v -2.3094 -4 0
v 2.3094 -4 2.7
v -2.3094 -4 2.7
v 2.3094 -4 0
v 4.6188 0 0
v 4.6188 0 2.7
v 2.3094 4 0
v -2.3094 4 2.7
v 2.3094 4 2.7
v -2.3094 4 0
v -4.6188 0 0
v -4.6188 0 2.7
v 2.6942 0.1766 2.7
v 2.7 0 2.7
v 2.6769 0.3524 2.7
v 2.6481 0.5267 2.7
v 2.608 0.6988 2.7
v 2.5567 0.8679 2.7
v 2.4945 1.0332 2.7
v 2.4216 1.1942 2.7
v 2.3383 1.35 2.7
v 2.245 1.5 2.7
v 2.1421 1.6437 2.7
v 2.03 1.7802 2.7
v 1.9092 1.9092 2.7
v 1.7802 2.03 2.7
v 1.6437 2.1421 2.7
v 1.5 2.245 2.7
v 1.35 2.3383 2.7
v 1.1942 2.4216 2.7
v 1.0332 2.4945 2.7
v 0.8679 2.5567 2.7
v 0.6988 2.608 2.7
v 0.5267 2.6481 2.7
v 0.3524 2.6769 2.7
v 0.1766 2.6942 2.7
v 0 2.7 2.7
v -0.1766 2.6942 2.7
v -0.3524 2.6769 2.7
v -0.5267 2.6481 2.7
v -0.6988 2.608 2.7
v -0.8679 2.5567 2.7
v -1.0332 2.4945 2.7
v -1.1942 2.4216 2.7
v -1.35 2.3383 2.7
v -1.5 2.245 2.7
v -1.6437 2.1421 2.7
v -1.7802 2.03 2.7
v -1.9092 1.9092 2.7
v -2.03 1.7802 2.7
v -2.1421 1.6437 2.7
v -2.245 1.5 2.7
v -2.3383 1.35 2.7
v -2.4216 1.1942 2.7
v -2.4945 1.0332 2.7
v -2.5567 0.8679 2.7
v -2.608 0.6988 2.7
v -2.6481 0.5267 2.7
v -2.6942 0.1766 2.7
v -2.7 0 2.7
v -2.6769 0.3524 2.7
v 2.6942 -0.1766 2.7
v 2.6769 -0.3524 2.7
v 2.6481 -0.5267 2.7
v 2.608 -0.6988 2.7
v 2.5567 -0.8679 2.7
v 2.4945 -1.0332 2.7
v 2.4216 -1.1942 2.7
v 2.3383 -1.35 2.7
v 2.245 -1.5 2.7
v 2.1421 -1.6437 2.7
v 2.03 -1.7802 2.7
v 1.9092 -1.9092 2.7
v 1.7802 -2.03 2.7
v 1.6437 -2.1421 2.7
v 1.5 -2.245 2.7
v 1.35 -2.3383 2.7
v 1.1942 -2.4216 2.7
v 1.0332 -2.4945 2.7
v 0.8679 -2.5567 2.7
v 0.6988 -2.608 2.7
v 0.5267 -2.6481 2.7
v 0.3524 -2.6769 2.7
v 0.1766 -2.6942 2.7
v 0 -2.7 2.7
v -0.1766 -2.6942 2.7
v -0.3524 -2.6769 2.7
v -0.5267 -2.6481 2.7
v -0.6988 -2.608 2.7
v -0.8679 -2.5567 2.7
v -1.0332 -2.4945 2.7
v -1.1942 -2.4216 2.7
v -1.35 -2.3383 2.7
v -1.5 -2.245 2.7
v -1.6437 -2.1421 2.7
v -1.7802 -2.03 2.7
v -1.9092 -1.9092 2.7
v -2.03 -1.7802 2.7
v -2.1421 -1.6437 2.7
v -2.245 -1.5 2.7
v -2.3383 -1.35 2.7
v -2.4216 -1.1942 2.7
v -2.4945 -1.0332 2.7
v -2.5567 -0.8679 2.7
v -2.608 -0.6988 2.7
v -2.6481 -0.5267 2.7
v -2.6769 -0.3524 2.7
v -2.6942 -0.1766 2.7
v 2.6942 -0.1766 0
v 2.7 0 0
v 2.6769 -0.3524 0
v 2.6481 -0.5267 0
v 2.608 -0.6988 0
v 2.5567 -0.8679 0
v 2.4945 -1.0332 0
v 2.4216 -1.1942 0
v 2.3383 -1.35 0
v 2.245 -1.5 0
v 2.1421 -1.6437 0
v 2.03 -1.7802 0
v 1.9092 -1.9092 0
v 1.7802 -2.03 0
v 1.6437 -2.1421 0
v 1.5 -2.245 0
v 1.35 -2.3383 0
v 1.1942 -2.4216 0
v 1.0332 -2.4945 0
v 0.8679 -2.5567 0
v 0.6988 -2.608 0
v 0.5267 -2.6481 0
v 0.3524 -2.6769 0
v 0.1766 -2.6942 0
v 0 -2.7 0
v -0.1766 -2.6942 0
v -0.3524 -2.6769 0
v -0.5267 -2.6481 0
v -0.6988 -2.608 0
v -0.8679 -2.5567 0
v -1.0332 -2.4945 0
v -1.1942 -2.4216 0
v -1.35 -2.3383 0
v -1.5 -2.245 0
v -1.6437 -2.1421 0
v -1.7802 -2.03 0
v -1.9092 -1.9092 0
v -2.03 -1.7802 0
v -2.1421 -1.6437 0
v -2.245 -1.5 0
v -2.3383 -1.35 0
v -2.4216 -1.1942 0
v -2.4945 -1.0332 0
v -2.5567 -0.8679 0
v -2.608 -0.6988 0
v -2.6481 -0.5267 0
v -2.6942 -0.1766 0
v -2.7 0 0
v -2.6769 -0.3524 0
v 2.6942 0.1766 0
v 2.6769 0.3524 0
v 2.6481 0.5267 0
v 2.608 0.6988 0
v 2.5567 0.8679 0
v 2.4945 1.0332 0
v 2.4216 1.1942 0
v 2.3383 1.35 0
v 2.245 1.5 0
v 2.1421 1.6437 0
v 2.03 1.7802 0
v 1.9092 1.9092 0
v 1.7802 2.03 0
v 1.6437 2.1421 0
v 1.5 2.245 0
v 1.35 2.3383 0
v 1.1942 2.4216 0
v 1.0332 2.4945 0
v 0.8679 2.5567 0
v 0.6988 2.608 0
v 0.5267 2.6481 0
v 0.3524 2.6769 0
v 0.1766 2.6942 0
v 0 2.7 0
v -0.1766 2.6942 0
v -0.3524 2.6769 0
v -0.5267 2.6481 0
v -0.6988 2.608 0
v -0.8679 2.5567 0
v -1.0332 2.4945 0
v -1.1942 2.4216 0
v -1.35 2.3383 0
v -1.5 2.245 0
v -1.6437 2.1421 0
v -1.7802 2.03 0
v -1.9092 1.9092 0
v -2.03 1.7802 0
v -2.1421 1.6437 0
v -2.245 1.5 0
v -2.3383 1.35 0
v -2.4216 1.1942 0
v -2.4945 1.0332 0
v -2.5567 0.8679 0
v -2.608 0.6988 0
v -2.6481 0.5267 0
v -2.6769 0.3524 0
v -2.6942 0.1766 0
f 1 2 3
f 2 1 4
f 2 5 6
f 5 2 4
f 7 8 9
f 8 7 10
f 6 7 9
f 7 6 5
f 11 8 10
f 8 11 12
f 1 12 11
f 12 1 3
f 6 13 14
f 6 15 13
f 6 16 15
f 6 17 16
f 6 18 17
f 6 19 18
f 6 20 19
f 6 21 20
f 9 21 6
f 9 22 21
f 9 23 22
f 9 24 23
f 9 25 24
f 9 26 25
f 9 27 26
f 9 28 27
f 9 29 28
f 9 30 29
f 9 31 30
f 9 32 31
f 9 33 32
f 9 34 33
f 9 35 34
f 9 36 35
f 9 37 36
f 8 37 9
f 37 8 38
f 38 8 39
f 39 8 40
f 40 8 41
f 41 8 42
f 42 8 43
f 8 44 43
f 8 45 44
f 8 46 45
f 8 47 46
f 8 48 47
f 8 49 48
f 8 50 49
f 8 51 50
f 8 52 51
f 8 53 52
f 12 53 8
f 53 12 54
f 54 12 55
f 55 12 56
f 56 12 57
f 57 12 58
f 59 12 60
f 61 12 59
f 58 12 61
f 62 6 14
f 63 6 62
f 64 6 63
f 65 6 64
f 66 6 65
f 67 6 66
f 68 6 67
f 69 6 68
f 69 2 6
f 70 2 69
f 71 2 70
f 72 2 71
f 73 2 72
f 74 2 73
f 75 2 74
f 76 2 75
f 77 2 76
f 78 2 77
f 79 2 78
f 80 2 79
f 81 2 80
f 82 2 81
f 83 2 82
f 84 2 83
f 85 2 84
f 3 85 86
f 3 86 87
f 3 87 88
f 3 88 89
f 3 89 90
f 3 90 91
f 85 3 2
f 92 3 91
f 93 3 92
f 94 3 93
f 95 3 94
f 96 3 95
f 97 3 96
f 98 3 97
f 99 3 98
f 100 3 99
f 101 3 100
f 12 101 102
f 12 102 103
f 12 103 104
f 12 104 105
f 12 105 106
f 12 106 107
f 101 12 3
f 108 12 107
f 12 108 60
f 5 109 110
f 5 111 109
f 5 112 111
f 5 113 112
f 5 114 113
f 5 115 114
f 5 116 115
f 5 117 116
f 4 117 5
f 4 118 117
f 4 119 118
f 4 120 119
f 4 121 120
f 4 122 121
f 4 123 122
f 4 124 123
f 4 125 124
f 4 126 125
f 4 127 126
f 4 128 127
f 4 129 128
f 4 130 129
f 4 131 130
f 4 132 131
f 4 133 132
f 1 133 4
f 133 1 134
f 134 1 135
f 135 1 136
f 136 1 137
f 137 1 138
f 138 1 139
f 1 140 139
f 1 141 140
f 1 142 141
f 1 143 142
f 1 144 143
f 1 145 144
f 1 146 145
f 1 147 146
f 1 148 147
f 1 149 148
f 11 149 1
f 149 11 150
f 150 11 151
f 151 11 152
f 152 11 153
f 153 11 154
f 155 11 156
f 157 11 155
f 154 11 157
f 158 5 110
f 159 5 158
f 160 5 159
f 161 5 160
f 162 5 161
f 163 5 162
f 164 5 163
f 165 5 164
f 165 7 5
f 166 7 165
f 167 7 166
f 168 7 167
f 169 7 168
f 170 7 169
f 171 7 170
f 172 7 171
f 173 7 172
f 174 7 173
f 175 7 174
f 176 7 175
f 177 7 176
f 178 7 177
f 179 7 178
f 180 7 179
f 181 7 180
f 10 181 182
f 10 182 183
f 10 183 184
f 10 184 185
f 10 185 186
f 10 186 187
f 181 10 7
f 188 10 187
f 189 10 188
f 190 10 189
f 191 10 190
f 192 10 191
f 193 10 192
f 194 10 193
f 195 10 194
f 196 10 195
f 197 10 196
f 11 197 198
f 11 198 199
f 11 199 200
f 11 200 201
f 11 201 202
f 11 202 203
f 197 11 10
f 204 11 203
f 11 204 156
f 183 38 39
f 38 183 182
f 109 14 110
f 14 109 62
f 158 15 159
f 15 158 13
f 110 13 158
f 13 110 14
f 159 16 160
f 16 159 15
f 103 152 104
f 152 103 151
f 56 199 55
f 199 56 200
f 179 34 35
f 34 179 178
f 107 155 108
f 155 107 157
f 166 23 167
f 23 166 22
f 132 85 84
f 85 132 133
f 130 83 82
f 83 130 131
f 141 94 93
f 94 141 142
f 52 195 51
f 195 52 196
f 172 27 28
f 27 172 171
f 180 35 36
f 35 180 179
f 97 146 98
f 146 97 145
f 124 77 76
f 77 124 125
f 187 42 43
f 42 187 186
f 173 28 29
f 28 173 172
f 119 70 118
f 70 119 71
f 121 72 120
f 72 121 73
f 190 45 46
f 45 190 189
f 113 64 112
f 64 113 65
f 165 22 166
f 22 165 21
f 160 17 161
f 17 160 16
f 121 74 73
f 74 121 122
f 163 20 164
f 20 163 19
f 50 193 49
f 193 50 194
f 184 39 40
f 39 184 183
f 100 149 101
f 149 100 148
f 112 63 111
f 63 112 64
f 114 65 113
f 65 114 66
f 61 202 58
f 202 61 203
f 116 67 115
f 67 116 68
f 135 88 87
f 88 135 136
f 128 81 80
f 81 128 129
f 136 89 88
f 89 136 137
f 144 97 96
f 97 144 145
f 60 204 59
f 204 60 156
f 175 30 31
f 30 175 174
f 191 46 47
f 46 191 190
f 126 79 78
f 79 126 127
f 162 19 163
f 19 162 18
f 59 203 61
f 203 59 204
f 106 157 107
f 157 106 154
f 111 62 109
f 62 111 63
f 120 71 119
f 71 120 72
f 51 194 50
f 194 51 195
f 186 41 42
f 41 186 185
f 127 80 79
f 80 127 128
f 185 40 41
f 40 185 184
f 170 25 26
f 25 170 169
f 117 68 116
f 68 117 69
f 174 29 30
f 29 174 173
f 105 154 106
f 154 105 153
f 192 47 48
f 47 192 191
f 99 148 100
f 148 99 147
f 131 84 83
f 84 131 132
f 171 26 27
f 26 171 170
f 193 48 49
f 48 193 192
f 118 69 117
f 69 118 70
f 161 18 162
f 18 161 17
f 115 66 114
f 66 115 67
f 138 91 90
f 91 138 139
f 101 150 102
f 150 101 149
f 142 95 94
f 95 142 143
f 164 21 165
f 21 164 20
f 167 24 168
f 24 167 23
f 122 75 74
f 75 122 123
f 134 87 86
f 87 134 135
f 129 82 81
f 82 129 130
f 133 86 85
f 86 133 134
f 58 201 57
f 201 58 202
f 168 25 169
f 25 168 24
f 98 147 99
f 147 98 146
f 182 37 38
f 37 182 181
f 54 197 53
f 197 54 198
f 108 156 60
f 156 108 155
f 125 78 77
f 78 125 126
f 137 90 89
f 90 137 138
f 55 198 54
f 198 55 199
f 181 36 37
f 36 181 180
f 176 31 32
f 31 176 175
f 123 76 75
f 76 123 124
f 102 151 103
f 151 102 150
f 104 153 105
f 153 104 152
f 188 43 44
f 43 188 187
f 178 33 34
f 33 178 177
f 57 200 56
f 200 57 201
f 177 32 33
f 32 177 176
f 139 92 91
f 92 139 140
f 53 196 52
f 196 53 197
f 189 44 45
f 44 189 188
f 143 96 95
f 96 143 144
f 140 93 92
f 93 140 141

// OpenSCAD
$fn = 96;

screw_d = 5.0;          // nominal screw diameter (mm)
clearance = 0.4;        // typical clearance for M5 (mm)
hole_d = screw_d + clearance;

across_flats = 8.0;     // mm
thickness = 2.7;        // mm

// For a regular hexagon: across_flats = 2 * apothem
apothem = across_flats / 2;
outer_r = apothem / cos(30);  // circumradius

difference() {
    cylinder(h = thickness, r = outer_r, $fn = 6);
    translate([0, 0, -0.1])
        cylinder(h = thickness + 0.2, d = hole_d, $fn = 96);
}
